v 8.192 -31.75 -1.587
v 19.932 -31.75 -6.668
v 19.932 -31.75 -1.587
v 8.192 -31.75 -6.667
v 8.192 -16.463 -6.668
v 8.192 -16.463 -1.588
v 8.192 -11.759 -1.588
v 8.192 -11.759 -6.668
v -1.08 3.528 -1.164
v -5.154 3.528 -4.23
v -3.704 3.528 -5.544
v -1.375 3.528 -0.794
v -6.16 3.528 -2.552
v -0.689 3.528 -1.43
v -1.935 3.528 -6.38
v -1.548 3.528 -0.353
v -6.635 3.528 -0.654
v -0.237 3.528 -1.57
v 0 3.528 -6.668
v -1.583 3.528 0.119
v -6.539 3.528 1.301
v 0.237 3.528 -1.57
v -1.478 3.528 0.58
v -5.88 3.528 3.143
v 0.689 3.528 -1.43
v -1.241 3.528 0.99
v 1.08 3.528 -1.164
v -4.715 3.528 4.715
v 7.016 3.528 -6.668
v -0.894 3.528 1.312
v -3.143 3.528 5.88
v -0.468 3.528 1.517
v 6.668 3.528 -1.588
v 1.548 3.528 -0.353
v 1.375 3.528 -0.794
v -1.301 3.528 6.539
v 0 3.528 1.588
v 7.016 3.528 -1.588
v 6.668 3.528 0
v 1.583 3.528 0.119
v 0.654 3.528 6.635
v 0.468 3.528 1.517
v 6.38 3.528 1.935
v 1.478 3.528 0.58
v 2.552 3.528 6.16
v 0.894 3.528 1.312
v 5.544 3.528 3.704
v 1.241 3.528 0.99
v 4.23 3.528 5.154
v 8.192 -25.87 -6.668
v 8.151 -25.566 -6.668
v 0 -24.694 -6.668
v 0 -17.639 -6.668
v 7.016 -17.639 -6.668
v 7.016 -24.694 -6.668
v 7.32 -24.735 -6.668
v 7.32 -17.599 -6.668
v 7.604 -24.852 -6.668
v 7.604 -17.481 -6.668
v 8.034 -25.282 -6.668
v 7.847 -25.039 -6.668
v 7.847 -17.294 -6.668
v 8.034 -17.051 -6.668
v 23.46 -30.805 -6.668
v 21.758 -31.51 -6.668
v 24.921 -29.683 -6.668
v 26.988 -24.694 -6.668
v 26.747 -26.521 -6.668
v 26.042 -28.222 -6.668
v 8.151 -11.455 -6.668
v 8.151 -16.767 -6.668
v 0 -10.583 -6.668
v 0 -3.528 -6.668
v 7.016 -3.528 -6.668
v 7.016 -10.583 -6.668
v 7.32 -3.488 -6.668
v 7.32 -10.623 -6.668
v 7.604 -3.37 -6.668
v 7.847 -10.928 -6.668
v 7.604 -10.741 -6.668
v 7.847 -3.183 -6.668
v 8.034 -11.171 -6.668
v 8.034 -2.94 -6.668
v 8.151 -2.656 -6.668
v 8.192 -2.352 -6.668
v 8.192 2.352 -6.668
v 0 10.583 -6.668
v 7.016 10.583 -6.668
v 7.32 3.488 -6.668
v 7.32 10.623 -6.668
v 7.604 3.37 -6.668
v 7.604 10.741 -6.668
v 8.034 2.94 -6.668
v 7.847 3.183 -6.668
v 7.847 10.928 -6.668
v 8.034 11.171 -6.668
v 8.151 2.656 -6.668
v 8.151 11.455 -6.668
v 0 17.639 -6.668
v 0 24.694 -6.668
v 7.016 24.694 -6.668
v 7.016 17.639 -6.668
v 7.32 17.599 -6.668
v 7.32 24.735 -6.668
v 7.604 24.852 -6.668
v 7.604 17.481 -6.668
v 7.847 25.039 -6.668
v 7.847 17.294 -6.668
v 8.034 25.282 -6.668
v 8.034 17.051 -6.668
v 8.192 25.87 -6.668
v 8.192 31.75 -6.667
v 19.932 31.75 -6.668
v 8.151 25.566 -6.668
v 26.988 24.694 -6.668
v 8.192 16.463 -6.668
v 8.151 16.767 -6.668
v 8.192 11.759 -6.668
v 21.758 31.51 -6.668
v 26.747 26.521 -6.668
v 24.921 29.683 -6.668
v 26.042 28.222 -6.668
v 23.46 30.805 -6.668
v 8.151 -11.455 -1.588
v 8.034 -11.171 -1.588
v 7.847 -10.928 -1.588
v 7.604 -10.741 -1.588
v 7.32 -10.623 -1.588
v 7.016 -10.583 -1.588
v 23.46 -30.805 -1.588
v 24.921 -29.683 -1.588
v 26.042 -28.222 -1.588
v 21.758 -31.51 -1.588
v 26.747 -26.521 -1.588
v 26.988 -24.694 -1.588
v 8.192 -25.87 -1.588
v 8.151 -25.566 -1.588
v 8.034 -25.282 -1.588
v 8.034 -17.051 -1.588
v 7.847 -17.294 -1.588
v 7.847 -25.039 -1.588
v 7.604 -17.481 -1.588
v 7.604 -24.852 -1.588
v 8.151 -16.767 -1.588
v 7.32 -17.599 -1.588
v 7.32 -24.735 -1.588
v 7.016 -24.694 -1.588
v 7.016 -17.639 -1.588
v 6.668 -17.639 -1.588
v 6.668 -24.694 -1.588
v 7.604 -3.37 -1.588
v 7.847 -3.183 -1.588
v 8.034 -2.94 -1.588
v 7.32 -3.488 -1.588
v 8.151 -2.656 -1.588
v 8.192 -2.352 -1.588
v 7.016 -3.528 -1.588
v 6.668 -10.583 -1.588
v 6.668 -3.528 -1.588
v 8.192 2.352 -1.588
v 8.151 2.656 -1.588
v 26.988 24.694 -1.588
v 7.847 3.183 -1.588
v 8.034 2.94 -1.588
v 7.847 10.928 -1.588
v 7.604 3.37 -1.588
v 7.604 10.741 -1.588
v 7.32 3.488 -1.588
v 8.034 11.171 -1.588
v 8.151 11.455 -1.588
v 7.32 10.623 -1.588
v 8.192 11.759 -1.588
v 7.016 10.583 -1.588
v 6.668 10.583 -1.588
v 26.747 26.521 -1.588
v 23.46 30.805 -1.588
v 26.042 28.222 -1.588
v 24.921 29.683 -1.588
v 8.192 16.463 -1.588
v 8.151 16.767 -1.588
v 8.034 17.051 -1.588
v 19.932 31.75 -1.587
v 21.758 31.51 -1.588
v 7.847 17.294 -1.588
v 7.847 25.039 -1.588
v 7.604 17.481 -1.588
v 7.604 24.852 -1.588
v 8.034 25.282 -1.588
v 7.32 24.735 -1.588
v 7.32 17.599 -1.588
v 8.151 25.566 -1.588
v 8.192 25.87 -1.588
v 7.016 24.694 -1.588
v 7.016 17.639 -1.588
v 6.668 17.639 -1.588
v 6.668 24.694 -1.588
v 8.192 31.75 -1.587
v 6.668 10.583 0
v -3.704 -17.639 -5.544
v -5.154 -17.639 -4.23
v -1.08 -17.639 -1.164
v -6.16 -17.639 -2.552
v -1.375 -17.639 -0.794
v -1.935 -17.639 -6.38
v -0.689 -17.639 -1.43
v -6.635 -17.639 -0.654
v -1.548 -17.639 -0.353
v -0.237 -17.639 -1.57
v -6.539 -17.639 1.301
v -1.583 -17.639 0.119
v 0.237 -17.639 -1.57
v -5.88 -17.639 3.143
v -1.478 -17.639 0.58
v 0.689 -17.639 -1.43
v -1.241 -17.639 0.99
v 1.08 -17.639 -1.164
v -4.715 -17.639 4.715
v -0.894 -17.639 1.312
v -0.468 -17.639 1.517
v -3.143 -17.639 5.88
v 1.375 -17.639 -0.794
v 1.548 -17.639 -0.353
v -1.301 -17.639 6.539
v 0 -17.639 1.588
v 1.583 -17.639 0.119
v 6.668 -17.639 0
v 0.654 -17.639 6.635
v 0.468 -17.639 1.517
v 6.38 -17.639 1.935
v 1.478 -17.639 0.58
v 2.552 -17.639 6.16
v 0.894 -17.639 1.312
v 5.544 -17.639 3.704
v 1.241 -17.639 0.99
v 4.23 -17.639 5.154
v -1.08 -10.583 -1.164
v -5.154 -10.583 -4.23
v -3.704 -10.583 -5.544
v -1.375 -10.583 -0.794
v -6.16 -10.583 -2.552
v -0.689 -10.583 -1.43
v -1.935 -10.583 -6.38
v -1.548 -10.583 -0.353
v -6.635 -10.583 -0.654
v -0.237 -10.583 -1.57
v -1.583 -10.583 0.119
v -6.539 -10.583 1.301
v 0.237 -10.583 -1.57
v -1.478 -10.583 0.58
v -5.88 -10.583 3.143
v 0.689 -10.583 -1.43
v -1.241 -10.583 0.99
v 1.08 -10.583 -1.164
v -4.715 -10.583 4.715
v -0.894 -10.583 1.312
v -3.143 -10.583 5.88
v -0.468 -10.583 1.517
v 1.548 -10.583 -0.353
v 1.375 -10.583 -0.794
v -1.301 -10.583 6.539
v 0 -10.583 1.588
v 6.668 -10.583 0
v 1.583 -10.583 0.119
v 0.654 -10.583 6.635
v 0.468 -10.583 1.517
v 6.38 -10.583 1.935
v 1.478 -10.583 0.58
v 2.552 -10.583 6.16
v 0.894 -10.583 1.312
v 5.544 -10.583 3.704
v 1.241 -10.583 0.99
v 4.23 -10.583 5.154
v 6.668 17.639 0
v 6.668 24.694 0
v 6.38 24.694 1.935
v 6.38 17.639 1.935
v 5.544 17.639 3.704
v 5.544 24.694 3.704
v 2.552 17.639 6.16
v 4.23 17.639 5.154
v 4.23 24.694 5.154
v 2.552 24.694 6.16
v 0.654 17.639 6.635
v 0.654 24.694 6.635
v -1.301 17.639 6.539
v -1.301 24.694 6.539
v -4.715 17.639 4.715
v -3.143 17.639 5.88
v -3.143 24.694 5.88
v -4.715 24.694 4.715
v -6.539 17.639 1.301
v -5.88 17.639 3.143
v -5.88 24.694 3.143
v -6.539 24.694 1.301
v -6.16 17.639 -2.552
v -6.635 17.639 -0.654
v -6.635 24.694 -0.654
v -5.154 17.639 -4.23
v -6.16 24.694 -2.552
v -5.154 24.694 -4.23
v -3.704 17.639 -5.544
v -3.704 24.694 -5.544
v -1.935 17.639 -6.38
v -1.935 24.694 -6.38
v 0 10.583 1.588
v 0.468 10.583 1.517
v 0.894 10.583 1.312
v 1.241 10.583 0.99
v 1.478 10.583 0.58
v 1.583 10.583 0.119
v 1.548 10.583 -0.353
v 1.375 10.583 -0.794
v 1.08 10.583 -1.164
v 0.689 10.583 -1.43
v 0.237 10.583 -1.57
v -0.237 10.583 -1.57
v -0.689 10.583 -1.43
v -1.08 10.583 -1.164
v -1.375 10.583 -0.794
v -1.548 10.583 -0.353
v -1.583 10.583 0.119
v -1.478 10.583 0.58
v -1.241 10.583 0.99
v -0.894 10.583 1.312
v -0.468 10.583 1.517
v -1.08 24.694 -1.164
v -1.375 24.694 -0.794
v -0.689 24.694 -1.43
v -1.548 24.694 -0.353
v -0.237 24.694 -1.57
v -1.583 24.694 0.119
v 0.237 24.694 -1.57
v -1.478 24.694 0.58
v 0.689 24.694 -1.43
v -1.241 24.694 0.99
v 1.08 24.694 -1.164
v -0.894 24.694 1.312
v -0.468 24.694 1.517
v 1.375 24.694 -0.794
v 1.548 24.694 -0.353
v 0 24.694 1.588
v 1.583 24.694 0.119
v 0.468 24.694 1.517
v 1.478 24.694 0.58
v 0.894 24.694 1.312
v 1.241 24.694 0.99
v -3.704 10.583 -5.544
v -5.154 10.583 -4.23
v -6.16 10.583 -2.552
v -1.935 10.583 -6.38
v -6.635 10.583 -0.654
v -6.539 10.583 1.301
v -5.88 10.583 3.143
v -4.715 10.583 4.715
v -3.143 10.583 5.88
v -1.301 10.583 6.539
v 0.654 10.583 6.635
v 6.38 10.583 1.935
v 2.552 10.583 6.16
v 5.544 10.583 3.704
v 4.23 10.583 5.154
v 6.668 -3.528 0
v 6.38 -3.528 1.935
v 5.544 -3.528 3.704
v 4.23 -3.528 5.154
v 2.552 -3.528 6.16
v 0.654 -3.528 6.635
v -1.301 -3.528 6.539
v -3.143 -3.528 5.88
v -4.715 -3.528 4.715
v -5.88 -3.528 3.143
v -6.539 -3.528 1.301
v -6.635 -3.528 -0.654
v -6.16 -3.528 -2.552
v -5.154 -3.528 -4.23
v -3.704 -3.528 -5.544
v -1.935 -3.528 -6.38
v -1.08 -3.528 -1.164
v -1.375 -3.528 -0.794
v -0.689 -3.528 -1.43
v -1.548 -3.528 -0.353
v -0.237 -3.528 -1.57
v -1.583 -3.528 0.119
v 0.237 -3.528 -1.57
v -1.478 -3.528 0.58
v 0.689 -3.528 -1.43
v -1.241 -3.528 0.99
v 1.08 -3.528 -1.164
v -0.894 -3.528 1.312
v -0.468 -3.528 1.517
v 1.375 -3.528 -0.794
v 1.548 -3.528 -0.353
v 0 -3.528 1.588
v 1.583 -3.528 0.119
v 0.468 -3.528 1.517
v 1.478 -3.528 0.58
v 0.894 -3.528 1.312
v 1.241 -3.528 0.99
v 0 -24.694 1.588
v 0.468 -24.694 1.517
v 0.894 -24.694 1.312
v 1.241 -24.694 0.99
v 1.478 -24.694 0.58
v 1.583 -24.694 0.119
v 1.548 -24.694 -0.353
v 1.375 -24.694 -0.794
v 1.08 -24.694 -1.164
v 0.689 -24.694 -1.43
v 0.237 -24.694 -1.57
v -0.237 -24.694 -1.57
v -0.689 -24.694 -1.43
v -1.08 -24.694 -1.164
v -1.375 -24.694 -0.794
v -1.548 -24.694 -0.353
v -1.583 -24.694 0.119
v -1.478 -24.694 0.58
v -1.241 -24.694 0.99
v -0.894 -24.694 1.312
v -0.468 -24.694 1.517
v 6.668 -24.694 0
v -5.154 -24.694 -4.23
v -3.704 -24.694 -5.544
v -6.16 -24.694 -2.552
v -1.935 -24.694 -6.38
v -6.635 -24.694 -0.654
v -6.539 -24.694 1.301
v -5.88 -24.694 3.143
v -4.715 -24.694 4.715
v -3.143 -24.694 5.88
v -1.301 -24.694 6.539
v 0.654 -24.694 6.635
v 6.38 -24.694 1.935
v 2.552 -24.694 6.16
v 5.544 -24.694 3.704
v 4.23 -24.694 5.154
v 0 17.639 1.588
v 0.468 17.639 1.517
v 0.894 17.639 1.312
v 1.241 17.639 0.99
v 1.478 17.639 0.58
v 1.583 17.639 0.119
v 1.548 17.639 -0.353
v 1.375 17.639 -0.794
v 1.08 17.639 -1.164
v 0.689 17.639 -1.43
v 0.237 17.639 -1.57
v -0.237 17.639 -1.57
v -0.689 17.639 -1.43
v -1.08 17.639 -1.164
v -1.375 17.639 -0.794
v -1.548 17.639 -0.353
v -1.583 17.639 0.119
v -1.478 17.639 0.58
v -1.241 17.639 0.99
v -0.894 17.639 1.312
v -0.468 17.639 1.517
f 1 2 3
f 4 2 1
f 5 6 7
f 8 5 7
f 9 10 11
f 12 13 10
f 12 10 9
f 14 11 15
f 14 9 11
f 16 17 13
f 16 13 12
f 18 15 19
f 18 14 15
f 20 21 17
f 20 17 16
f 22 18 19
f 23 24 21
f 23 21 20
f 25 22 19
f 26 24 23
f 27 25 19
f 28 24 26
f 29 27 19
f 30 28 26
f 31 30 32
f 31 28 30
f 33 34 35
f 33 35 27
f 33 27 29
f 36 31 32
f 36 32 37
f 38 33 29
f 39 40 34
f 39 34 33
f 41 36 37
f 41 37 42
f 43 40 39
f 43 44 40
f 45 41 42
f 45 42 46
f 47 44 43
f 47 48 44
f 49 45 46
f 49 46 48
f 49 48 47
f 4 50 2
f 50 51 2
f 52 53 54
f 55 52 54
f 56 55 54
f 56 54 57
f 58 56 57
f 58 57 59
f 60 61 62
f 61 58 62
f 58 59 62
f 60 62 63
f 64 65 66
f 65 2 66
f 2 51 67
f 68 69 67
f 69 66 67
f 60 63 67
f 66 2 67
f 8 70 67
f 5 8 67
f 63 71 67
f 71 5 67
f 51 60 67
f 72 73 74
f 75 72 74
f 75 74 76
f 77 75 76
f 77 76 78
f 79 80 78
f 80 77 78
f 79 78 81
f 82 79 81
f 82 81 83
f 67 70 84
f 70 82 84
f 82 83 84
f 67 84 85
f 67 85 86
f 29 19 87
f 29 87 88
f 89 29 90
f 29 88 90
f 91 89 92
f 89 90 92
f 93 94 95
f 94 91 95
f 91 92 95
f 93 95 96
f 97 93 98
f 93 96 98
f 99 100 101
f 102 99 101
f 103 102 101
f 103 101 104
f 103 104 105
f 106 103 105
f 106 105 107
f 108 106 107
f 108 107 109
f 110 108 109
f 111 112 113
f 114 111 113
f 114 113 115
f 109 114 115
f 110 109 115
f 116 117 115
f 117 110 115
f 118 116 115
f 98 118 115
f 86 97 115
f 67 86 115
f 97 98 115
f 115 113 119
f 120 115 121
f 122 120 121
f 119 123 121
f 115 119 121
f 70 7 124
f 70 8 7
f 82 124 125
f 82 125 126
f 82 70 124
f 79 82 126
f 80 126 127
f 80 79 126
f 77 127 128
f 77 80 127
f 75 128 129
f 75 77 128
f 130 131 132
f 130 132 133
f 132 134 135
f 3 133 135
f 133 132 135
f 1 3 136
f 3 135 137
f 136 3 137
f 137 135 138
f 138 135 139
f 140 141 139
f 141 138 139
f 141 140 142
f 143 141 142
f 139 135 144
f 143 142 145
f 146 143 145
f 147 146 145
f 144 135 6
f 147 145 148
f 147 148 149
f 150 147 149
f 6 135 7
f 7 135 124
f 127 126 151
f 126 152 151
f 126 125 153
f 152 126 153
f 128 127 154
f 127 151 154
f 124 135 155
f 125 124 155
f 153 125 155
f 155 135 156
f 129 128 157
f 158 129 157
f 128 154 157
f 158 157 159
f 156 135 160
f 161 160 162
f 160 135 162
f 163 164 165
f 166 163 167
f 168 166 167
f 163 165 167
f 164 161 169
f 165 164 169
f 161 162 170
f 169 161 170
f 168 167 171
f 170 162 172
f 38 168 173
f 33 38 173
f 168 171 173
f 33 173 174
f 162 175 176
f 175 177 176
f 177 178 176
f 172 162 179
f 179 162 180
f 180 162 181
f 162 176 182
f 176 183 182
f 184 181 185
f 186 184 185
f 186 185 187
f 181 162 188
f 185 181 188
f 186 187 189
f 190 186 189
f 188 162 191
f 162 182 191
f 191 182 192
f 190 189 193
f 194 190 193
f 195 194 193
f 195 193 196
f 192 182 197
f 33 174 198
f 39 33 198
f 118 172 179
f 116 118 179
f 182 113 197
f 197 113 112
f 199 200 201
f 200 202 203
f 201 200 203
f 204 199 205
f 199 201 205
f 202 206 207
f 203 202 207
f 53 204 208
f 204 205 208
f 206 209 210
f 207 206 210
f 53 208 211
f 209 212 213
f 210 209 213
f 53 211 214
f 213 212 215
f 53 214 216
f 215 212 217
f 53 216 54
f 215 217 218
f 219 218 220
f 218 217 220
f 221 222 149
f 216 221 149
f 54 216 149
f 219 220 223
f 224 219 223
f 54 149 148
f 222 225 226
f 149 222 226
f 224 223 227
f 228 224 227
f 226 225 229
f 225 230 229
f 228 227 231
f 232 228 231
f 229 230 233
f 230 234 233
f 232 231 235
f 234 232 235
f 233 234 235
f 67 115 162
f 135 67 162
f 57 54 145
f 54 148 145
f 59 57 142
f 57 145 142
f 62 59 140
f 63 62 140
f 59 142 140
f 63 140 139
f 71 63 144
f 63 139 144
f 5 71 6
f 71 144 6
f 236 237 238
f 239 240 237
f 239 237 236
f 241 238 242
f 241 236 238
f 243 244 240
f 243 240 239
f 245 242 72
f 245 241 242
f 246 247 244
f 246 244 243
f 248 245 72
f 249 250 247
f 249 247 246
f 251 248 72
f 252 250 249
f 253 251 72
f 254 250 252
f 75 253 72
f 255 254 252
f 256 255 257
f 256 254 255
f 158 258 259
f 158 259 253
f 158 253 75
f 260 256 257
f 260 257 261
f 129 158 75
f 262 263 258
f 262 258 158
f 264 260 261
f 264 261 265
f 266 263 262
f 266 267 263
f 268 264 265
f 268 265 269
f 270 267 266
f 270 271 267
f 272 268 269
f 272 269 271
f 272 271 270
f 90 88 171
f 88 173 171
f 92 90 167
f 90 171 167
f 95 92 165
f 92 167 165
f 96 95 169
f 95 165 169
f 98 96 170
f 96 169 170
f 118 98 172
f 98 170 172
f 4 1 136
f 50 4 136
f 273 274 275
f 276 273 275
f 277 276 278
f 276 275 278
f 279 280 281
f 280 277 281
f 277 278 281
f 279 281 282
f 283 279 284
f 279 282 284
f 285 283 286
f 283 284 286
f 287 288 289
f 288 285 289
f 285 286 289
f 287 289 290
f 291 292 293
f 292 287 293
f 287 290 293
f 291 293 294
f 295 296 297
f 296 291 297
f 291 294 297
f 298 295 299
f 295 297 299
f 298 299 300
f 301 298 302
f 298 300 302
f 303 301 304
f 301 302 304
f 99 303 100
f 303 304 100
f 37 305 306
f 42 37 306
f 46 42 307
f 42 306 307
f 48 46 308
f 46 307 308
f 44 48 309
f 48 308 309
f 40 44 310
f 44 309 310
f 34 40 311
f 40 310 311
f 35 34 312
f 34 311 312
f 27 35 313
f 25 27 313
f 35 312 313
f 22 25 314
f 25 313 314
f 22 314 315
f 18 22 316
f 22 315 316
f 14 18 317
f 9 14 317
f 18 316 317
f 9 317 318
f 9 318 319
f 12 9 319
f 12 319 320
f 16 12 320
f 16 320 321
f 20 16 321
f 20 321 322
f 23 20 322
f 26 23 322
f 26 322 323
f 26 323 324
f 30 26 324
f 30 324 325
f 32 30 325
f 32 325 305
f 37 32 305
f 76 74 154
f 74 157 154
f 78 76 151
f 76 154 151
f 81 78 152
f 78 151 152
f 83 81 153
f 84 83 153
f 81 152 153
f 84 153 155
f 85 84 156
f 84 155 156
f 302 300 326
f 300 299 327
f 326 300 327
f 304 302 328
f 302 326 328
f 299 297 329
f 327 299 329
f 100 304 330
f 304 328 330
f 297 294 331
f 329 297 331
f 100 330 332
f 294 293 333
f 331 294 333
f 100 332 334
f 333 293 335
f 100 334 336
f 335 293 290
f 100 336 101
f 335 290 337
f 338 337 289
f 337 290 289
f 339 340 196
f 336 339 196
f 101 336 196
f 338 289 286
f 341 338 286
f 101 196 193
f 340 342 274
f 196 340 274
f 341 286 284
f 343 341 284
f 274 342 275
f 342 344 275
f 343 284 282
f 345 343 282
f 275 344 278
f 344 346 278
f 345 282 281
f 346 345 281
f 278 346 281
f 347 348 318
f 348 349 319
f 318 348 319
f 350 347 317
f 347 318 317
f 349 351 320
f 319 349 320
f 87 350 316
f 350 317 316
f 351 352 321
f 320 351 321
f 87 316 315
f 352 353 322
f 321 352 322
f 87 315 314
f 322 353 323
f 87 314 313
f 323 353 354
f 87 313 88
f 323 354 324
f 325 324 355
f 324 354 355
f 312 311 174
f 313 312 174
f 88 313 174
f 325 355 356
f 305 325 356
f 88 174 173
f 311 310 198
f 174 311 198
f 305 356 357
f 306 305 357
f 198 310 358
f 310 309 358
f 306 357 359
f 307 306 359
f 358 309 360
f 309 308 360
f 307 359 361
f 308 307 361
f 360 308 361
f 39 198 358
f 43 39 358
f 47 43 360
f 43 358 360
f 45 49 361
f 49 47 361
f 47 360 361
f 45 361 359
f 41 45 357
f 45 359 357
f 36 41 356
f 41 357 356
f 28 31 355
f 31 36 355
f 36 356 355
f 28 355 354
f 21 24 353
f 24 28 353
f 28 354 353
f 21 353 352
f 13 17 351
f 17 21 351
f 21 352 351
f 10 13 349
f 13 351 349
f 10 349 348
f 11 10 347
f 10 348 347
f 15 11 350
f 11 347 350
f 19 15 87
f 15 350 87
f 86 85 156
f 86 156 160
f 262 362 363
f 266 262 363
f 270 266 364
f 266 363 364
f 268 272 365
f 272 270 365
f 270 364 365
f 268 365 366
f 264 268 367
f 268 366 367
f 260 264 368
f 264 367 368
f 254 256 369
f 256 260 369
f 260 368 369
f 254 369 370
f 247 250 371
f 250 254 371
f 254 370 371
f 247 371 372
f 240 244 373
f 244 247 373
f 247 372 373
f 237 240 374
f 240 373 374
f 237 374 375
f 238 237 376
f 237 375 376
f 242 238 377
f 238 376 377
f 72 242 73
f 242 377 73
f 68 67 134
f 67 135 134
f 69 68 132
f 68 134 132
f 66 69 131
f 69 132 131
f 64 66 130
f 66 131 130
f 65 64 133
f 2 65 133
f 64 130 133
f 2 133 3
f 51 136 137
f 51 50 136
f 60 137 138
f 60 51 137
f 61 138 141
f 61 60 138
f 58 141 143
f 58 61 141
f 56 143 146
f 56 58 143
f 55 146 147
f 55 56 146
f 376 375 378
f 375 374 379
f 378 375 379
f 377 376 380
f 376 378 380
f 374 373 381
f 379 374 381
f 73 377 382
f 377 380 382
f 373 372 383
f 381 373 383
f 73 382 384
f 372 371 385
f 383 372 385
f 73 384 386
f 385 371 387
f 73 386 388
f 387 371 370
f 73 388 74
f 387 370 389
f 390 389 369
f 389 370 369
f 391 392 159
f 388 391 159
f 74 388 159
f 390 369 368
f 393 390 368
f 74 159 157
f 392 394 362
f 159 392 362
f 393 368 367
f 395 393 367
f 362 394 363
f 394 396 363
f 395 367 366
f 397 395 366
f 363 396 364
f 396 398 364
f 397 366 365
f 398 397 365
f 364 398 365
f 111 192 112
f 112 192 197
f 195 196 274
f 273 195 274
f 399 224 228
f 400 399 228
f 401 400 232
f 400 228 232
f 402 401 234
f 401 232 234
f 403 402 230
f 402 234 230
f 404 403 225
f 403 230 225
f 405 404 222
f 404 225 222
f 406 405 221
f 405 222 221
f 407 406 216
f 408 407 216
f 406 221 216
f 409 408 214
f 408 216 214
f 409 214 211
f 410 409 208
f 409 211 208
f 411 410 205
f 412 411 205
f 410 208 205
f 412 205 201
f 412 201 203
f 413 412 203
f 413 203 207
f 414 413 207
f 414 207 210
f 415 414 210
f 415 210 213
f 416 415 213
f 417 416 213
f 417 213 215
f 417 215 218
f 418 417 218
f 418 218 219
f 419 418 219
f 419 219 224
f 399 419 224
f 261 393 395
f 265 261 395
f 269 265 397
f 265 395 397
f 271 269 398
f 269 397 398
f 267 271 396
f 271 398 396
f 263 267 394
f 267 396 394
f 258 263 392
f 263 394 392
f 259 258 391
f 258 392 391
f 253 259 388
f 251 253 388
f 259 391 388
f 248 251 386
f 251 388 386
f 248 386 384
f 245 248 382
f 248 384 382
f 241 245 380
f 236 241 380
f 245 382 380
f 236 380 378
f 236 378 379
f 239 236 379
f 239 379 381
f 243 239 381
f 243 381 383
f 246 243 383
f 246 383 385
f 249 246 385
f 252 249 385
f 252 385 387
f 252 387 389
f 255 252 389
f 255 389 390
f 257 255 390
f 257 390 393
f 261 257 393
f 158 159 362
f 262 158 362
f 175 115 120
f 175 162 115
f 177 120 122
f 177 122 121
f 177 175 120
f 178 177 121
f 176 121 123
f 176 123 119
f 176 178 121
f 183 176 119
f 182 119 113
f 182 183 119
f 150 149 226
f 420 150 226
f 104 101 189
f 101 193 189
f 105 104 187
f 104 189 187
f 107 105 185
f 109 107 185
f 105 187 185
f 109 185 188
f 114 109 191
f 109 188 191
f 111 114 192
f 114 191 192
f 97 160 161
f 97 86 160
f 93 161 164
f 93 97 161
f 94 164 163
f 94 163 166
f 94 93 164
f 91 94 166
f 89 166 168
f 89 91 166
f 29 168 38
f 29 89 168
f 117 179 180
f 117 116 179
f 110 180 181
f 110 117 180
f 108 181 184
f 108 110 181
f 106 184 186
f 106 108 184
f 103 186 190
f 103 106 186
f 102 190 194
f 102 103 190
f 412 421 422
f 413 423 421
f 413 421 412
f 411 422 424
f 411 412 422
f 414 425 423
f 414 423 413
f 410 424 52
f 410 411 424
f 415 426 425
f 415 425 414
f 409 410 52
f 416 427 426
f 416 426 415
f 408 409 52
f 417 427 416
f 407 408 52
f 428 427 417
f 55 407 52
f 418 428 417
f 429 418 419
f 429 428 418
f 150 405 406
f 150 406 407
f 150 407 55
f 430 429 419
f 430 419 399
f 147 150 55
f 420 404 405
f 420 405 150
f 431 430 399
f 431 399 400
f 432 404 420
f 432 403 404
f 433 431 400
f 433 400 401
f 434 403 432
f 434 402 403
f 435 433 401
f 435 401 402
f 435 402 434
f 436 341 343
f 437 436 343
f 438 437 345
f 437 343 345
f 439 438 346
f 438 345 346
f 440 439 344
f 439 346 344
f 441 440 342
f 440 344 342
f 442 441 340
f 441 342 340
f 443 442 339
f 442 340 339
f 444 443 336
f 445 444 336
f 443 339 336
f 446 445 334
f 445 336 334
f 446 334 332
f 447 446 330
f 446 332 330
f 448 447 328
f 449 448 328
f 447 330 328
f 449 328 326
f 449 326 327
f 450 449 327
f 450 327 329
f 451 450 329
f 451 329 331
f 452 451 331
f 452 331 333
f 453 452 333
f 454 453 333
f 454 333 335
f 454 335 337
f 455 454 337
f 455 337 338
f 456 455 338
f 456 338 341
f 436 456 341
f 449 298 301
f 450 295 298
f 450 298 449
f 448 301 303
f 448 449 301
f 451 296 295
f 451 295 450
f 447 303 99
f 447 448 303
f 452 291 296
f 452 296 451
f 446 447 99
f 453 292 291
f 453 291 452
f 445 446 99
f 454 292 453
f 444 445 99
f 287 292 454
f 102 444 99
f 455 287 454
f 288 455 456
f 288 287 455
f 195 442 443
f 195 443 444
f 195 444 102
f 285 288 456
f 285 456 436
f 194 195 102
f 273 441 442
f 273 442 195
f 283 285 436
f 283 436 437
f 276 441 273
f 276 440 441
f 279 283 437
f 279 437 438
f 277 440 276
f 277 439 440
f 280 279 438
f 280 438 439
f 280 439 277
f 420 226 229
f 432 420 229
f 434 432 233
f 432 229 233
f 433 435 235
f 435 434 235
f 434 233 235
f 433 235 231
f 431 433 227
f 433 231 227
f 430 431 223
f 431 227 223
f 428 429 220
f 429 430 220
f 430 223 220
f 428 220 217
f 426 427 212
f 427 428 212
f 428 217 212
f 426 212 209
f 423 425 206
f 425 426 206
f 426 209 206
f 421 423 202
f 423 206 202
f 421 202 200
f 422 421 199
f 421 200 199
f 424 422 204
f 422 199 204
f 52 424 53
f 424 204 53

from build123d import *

# Parameters (mm, degrees)
BOSS_EXTRUDE1_START = 31.75
SKETCH3_R           = 1.5875
BOSS_EXTRUDE1_DEPTH = 63.5
FILLET1_R           = 7.055555556
SKETCH5_W           = 16.383
SKETCH5_H           = 7.055555556
CUT_EXTRUDE1_DEPTH  = 43.200038063
LPATTERN1_COUNT     = 5
LPATTERN1_PITCH     = 14.111111111
FILLET2_R           = 1.175925926


with BuildPart() as part:
    # Sketch3 → Boss-Extrude1 (new body)
    with BuildSketch(Plane(origin=(0, 0, 0), x_dir=(1, 0, 0), z_dir=(0, 1, 0)).offset(BOSS_EXTRUDE1_START)):
        with BuildLine():
            Line((26.9875, 6.6675), (26.9875, 1.5875))
            Line((26.9875, 1.5875), (6.6675, 1.5875))
            Line((6.6675, 1.5875), (6.6675, 0))
            ThreePointArc((6.6675, 0), (-4.714634464, -4.714634464), (0, 6.6675))
            Line((0, 6.6675), (26.9875, 6.6675))
        make_face()
        with Locations(Location((0, 0, 0), (0, 0, 270))):
            Circle(SKETCH3_R, mode=Mode.SUBTRACT)
    extrude(amount=-BOSS_EXTRUDE1_DEPTH)

    # Fillet1
    fillet1_edges = [part.edges().sort_by_distance(p)[0] for p in [
        (26.9875, -31.75, -4.1275),
        (26.9875, 31.75, -4.1275),
    ]]
    fillet(fillet1_edges, radius=FILLET1_R)

    # Sketch5 → Cut-Extrude1 (cut, symmetric)
    with BuildSketch(Plane.XY):
        with Locations((0, 28.222222222)):
            Rectangle(SKETCH5_W, SKETCH5_H)
    cut_extrude1 = extrude(amount=CUT_EXTRUDE1_DEPTH, both=True, mode=Mode.SUBTRACT)

    # LPattern1: Cut-Extrude1 ×5
    with Locations(*[(0, -i * LPATTERN1_PITCH, 0) for i in range(1, LPATTERN1_COUNT)]):
        add(cut_extrude1, mode=Mode.SUBTRACT)

    # Fillet2
    fillet2_edges = [part.edges().sort_by_distance(p)[0] for p in [
        (8.1915, -3.527777778, -4.1275),
        (8.1915, 3.527777778, -4.1275),
        (8.1915, -17.638888889, -4.1275),
        (8.1915, -10.583333333, -4.1275),
        (8.1915, -24.694444444, -4.1275),
        (8.1915, 24.694444444, -4.1275),
        (8.1915, 10.583333333, -4.1275),
        (8.1915, 17.638888889, -4.1275),
    ]]
    fillet(fillet2_edges, radius=FILLET2_R)


solid = part.part
